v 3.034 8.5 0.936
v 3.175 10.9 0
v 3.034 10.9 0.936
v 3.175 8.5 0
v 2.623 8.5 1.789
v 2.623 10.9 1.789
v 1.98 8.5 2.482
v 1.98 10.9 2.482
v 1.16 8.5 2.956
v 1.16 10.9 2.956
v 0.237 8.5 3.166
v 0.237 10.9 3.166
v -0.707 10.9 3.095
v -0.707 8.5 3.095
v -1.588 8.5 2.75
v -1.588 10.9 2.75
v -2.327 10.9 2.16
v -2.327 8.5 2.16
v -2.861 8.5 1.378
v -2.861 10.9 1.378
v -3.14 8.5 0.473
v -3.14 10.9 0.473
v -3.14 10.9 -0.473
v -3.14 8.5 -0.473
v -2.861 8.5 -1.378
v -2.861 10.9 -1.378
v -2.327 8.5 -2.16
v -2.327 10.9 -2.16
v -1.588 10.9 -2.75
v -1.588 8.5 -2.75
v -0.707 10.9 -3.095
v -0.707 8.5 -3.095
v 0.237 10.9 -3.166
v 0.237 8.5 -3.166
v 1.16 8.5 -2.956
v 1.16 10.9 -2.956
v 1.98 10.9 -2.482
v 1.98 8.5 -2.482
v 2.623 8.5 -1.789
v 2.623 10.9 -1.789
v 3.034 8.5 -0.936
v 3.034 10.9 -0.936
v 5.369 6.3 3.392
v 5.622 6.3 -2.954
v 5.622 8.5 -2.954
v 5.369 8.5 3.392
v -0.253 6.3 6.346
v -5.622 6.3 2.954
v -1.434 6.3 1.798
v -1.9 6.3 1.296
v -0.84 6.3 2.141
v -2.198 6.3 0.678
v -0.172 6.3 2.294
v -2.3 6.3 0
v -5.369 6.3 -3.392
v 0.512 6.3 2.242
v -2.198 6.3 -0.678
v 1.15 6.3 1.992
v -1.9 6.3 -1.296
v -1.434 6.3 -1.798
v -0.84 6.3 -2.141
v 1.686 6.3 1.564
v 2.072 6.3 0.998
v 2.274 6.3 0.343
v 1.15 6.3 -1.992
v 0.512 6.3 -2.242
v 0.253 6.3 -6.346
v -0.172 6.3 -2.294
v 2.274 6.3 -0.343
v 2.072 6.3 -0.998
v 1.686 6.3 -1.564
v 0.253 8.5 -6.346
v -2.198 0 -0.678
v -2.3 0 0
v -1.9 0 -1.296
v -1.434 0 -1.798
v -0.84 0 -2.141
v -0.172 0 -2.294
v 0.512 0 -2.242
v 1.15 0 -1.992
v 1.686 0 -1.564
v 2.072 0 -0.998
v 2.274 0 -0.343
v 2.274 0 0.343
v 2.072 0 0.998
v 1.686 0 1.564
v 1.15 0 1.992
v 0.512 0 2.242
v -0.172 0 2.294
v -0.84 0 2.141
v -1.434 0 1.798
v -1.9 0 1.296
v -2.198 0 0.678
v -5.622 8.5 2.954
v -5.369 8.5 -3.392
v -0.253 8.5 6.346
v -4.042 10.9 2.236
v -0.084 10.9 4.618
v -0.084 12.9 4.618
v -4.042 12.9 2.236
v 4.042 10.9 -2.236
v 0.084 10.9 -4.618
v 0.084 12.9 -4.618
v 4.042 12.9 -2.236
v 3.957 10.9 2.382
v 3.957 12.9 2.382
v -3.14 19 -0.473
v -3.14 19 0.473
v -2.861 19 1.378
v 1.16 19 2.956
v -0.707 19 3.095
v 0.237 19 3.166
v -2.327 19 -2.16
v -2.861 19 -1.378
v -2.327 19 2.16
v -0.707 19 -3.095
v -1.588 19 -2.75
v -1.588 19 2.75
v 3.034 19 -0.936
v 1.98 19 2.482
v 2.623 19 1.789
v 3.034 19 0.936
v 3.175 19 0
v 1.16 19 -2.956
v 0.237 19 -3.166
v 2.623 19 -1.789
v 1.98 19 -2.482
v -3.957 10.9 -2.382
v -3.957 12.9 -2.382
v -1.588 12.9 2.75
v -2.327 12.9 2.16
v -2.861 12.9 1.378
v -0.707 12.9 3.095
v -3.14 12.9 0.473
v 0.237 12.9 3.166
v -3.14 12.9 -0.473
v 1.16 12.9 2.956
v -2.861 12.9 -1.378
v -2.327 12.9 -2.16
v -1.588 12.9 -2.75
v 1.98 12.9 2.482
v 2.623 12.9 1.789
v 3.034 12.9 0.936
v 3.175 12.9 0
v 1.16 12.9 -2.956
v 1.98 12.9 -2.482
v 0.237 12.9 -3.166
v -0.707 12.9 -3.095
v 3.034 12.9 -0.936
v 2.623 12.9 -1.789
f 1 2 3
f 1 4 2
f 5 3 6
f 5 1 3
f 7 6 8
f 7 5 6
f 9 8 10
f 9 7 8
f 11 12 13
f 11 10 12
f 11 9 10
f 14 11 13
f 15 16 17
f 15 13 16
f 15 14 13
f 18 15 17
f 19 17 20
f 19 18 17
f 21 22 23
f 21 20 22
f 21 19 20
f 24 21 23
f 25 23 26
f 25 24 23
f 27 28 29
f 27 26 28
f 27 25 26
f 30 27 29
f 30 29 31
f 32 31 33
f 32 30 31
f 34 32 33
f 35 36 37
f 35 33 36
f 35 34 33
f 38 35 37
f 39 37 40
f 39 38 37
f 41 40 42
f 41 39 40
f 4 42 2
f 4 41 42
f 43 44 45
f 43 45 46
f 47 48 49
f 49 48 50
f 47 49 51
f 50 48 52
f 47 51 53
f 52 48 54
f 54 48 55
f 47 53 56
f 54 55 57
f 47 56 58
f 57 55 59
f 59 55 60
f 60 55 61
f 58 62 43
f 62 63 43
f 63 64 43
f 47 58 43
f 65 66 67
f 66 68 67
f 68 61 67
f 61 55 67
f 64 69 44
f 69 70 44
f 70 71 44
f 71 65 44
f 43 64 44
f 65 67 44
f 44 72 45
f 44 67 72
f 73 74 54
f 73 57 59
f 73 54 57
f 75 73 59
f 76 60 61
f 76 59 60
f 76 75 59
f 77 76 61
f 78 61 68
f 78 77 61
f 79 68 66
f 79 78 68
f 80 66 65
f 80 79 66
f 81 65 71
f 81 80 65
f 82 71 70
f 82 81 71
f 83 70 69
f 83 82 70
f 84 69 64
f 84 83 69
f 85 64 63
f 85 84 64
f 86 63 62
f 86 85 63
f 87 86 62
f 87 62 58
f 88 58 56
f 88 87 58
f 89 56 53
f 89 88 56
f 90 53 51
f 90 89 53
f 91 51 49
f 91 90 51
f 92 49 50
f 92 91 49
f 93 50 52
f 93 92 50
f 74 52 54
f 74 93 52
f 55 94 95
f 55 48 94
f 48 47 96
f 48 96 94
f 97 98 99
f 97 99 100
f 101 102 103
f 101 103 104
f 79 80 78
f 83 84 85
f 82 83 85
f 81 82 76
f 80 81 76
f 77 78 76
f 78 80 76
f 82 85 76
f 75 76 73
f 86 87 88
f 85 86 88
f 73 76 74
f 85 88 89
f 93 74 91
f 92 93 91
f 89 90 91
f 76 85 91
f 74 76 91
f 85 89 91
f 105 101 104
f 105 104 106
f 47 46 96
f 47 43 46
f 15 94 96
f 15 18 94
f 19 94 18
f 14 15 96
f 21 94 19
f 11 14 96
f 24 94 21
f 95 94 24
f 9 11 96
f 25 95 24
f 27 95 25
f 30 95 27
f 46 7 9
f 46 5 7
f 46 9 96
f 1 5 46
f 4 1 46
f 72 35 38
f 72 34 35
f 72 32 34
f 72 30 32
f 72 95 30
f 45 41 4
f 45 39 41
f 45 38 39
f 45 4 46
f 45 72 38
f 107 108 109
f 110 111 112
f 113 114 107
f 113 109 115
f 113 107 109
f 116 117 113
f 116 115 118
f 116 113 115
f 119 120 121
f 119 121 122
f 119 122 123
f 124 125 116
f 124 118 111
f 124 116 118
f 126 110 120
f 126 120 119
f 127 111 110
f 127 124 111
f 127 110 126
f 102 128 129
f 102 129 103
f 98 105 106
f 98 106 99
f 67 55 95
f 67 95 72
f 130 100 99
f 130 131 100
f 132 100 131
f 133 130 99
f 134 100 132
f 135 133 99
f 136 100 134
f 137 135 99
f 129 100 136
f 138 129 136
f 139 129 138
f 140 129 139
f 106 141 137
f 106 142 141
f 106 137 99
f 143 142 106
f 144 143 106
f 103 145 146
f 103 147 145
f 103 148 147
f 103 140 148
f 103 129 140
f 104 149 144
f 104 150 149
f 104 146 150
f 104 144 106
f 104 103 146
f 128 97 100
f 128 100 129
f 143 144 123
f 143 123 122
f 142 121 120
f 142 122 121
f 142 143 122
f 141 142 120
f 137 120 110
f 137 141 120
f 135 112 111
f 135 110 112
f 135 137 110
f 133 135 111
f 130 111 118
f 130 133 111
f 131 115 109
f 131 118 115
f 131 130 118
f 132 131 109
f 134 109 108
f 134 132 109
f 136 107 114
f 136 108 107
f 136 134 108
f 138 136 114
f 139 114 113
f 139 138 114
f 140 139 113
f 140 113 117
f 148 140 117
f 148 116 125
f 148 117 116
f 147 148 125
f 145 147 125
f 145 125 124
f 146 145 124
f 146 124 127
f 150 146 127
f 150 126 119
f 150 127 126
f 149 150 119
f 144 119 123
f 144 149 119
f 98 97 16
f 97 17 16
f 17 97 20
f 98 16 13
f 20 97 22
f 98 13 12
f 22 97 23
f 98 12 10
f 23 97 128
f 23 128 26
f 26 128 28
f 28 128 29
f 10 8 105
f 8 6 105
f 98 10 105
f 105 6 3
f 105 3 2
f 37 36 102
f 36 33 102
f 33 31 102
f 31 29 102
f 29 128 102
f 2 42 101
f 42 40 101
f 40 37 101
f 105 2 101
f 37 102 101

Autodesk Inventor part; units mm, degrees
ref_plane "YZ Plane" through (0, 0, 0) normal (1, 0, 0) x (0, 1, 0)
ref_plane "XZ Plane" through (0, 0, 0) normal (0, 1, 0) x (-1, 0, 0)
ref_plane "XY Plane" through (0, 0, 0) normal (0, 0, 1) x (1, 0, 0)
sketch "Sketch1" plane through (0, 0, 0) normal (0, 1, 0) x (-1, 0, 0)
  circle A0 centre (0, 0) radius 2.3
  dimension "d0" = 4.6
extrude "Extrusion1" add sketch "Sketch1" along normal blind 6.3
sketch "Sketch2" plane through (0, 6.3, 0) normal (0, 1, 0) x (1, 0, 0)
  circle A0 centre (0, 0) radius 2.3 projected
  line L0 (5.6221, 2.954) -> (5.3692, -3.3919)
  line L1 (5.3692, -3.3919) -> (-0.2528, -6.3458)
  line L2 (-0.2528, -6.3458) -> (-5.6221, -2.954)
  line L3 (-5.6221, -2.954) -> (-5.3692, 3.3919)
  line L4 (-5.3692, 3.3919) -> (0.2528, 6.3458)
  line L5 (0.2528, 6.3458) -> (5.6221, 2.954)
  dimension "d10" = 11
extrude "Extrusion2" add sketch "Sketch2" along normal blind 2.2 contours A0 | L0 L1 L2 L3 L4 L5
sketch "Sketch3" plane through (0, 8.5, 0) normal (0, 1, 0) x (1, 0, 0)
  circle A0 centre (0, 0) radius 3.175
  dimension "d6" = 6.35
extrude "Extrusion3" add sketch "Sketch3" along normal blind 2.4
sketch "Sketch4" plane through (0, 10.9, 0) normal (0, 1, 0) x (1, 0, 0)
  circle A0 centre (0, 0) radius 3.175 projected
  line L0 (4.0415, 2.236) -> (3.9572, -2.3821)
  line L1 (3.9572, -2.3821) -> (-0.0844, -4.618)
  line L2 (-0.0844, -4.618) -> (-4.0415, -2.236)
  line L3 (-4.0415, -2.236) -> (-3.9572, 2.3821)
  line L4 (-3.9572, 2.3821) -> (0.0844, 4.618)
  line L5 (0.0844, 4.618) -> (4.0415, 2.236)
  dimension "d9" = 8
extrude "Extrusion4" add sketch "Sketch4" along normal blind 2 contours A0 | L0 L1 L2 L3 L4 L5
sketch "Sketch5" plane through (0, 12.9, 0) normal (0, 1, 0) x (1, 0, 0)
  circle A0 centre (0, 0) radius 3.175
  dimension "d13" = 6.35
extrude "Extrusion5" add sketch "Sketch5" along normal blind 6.1
properties part number "SMA_Bulkhead"
